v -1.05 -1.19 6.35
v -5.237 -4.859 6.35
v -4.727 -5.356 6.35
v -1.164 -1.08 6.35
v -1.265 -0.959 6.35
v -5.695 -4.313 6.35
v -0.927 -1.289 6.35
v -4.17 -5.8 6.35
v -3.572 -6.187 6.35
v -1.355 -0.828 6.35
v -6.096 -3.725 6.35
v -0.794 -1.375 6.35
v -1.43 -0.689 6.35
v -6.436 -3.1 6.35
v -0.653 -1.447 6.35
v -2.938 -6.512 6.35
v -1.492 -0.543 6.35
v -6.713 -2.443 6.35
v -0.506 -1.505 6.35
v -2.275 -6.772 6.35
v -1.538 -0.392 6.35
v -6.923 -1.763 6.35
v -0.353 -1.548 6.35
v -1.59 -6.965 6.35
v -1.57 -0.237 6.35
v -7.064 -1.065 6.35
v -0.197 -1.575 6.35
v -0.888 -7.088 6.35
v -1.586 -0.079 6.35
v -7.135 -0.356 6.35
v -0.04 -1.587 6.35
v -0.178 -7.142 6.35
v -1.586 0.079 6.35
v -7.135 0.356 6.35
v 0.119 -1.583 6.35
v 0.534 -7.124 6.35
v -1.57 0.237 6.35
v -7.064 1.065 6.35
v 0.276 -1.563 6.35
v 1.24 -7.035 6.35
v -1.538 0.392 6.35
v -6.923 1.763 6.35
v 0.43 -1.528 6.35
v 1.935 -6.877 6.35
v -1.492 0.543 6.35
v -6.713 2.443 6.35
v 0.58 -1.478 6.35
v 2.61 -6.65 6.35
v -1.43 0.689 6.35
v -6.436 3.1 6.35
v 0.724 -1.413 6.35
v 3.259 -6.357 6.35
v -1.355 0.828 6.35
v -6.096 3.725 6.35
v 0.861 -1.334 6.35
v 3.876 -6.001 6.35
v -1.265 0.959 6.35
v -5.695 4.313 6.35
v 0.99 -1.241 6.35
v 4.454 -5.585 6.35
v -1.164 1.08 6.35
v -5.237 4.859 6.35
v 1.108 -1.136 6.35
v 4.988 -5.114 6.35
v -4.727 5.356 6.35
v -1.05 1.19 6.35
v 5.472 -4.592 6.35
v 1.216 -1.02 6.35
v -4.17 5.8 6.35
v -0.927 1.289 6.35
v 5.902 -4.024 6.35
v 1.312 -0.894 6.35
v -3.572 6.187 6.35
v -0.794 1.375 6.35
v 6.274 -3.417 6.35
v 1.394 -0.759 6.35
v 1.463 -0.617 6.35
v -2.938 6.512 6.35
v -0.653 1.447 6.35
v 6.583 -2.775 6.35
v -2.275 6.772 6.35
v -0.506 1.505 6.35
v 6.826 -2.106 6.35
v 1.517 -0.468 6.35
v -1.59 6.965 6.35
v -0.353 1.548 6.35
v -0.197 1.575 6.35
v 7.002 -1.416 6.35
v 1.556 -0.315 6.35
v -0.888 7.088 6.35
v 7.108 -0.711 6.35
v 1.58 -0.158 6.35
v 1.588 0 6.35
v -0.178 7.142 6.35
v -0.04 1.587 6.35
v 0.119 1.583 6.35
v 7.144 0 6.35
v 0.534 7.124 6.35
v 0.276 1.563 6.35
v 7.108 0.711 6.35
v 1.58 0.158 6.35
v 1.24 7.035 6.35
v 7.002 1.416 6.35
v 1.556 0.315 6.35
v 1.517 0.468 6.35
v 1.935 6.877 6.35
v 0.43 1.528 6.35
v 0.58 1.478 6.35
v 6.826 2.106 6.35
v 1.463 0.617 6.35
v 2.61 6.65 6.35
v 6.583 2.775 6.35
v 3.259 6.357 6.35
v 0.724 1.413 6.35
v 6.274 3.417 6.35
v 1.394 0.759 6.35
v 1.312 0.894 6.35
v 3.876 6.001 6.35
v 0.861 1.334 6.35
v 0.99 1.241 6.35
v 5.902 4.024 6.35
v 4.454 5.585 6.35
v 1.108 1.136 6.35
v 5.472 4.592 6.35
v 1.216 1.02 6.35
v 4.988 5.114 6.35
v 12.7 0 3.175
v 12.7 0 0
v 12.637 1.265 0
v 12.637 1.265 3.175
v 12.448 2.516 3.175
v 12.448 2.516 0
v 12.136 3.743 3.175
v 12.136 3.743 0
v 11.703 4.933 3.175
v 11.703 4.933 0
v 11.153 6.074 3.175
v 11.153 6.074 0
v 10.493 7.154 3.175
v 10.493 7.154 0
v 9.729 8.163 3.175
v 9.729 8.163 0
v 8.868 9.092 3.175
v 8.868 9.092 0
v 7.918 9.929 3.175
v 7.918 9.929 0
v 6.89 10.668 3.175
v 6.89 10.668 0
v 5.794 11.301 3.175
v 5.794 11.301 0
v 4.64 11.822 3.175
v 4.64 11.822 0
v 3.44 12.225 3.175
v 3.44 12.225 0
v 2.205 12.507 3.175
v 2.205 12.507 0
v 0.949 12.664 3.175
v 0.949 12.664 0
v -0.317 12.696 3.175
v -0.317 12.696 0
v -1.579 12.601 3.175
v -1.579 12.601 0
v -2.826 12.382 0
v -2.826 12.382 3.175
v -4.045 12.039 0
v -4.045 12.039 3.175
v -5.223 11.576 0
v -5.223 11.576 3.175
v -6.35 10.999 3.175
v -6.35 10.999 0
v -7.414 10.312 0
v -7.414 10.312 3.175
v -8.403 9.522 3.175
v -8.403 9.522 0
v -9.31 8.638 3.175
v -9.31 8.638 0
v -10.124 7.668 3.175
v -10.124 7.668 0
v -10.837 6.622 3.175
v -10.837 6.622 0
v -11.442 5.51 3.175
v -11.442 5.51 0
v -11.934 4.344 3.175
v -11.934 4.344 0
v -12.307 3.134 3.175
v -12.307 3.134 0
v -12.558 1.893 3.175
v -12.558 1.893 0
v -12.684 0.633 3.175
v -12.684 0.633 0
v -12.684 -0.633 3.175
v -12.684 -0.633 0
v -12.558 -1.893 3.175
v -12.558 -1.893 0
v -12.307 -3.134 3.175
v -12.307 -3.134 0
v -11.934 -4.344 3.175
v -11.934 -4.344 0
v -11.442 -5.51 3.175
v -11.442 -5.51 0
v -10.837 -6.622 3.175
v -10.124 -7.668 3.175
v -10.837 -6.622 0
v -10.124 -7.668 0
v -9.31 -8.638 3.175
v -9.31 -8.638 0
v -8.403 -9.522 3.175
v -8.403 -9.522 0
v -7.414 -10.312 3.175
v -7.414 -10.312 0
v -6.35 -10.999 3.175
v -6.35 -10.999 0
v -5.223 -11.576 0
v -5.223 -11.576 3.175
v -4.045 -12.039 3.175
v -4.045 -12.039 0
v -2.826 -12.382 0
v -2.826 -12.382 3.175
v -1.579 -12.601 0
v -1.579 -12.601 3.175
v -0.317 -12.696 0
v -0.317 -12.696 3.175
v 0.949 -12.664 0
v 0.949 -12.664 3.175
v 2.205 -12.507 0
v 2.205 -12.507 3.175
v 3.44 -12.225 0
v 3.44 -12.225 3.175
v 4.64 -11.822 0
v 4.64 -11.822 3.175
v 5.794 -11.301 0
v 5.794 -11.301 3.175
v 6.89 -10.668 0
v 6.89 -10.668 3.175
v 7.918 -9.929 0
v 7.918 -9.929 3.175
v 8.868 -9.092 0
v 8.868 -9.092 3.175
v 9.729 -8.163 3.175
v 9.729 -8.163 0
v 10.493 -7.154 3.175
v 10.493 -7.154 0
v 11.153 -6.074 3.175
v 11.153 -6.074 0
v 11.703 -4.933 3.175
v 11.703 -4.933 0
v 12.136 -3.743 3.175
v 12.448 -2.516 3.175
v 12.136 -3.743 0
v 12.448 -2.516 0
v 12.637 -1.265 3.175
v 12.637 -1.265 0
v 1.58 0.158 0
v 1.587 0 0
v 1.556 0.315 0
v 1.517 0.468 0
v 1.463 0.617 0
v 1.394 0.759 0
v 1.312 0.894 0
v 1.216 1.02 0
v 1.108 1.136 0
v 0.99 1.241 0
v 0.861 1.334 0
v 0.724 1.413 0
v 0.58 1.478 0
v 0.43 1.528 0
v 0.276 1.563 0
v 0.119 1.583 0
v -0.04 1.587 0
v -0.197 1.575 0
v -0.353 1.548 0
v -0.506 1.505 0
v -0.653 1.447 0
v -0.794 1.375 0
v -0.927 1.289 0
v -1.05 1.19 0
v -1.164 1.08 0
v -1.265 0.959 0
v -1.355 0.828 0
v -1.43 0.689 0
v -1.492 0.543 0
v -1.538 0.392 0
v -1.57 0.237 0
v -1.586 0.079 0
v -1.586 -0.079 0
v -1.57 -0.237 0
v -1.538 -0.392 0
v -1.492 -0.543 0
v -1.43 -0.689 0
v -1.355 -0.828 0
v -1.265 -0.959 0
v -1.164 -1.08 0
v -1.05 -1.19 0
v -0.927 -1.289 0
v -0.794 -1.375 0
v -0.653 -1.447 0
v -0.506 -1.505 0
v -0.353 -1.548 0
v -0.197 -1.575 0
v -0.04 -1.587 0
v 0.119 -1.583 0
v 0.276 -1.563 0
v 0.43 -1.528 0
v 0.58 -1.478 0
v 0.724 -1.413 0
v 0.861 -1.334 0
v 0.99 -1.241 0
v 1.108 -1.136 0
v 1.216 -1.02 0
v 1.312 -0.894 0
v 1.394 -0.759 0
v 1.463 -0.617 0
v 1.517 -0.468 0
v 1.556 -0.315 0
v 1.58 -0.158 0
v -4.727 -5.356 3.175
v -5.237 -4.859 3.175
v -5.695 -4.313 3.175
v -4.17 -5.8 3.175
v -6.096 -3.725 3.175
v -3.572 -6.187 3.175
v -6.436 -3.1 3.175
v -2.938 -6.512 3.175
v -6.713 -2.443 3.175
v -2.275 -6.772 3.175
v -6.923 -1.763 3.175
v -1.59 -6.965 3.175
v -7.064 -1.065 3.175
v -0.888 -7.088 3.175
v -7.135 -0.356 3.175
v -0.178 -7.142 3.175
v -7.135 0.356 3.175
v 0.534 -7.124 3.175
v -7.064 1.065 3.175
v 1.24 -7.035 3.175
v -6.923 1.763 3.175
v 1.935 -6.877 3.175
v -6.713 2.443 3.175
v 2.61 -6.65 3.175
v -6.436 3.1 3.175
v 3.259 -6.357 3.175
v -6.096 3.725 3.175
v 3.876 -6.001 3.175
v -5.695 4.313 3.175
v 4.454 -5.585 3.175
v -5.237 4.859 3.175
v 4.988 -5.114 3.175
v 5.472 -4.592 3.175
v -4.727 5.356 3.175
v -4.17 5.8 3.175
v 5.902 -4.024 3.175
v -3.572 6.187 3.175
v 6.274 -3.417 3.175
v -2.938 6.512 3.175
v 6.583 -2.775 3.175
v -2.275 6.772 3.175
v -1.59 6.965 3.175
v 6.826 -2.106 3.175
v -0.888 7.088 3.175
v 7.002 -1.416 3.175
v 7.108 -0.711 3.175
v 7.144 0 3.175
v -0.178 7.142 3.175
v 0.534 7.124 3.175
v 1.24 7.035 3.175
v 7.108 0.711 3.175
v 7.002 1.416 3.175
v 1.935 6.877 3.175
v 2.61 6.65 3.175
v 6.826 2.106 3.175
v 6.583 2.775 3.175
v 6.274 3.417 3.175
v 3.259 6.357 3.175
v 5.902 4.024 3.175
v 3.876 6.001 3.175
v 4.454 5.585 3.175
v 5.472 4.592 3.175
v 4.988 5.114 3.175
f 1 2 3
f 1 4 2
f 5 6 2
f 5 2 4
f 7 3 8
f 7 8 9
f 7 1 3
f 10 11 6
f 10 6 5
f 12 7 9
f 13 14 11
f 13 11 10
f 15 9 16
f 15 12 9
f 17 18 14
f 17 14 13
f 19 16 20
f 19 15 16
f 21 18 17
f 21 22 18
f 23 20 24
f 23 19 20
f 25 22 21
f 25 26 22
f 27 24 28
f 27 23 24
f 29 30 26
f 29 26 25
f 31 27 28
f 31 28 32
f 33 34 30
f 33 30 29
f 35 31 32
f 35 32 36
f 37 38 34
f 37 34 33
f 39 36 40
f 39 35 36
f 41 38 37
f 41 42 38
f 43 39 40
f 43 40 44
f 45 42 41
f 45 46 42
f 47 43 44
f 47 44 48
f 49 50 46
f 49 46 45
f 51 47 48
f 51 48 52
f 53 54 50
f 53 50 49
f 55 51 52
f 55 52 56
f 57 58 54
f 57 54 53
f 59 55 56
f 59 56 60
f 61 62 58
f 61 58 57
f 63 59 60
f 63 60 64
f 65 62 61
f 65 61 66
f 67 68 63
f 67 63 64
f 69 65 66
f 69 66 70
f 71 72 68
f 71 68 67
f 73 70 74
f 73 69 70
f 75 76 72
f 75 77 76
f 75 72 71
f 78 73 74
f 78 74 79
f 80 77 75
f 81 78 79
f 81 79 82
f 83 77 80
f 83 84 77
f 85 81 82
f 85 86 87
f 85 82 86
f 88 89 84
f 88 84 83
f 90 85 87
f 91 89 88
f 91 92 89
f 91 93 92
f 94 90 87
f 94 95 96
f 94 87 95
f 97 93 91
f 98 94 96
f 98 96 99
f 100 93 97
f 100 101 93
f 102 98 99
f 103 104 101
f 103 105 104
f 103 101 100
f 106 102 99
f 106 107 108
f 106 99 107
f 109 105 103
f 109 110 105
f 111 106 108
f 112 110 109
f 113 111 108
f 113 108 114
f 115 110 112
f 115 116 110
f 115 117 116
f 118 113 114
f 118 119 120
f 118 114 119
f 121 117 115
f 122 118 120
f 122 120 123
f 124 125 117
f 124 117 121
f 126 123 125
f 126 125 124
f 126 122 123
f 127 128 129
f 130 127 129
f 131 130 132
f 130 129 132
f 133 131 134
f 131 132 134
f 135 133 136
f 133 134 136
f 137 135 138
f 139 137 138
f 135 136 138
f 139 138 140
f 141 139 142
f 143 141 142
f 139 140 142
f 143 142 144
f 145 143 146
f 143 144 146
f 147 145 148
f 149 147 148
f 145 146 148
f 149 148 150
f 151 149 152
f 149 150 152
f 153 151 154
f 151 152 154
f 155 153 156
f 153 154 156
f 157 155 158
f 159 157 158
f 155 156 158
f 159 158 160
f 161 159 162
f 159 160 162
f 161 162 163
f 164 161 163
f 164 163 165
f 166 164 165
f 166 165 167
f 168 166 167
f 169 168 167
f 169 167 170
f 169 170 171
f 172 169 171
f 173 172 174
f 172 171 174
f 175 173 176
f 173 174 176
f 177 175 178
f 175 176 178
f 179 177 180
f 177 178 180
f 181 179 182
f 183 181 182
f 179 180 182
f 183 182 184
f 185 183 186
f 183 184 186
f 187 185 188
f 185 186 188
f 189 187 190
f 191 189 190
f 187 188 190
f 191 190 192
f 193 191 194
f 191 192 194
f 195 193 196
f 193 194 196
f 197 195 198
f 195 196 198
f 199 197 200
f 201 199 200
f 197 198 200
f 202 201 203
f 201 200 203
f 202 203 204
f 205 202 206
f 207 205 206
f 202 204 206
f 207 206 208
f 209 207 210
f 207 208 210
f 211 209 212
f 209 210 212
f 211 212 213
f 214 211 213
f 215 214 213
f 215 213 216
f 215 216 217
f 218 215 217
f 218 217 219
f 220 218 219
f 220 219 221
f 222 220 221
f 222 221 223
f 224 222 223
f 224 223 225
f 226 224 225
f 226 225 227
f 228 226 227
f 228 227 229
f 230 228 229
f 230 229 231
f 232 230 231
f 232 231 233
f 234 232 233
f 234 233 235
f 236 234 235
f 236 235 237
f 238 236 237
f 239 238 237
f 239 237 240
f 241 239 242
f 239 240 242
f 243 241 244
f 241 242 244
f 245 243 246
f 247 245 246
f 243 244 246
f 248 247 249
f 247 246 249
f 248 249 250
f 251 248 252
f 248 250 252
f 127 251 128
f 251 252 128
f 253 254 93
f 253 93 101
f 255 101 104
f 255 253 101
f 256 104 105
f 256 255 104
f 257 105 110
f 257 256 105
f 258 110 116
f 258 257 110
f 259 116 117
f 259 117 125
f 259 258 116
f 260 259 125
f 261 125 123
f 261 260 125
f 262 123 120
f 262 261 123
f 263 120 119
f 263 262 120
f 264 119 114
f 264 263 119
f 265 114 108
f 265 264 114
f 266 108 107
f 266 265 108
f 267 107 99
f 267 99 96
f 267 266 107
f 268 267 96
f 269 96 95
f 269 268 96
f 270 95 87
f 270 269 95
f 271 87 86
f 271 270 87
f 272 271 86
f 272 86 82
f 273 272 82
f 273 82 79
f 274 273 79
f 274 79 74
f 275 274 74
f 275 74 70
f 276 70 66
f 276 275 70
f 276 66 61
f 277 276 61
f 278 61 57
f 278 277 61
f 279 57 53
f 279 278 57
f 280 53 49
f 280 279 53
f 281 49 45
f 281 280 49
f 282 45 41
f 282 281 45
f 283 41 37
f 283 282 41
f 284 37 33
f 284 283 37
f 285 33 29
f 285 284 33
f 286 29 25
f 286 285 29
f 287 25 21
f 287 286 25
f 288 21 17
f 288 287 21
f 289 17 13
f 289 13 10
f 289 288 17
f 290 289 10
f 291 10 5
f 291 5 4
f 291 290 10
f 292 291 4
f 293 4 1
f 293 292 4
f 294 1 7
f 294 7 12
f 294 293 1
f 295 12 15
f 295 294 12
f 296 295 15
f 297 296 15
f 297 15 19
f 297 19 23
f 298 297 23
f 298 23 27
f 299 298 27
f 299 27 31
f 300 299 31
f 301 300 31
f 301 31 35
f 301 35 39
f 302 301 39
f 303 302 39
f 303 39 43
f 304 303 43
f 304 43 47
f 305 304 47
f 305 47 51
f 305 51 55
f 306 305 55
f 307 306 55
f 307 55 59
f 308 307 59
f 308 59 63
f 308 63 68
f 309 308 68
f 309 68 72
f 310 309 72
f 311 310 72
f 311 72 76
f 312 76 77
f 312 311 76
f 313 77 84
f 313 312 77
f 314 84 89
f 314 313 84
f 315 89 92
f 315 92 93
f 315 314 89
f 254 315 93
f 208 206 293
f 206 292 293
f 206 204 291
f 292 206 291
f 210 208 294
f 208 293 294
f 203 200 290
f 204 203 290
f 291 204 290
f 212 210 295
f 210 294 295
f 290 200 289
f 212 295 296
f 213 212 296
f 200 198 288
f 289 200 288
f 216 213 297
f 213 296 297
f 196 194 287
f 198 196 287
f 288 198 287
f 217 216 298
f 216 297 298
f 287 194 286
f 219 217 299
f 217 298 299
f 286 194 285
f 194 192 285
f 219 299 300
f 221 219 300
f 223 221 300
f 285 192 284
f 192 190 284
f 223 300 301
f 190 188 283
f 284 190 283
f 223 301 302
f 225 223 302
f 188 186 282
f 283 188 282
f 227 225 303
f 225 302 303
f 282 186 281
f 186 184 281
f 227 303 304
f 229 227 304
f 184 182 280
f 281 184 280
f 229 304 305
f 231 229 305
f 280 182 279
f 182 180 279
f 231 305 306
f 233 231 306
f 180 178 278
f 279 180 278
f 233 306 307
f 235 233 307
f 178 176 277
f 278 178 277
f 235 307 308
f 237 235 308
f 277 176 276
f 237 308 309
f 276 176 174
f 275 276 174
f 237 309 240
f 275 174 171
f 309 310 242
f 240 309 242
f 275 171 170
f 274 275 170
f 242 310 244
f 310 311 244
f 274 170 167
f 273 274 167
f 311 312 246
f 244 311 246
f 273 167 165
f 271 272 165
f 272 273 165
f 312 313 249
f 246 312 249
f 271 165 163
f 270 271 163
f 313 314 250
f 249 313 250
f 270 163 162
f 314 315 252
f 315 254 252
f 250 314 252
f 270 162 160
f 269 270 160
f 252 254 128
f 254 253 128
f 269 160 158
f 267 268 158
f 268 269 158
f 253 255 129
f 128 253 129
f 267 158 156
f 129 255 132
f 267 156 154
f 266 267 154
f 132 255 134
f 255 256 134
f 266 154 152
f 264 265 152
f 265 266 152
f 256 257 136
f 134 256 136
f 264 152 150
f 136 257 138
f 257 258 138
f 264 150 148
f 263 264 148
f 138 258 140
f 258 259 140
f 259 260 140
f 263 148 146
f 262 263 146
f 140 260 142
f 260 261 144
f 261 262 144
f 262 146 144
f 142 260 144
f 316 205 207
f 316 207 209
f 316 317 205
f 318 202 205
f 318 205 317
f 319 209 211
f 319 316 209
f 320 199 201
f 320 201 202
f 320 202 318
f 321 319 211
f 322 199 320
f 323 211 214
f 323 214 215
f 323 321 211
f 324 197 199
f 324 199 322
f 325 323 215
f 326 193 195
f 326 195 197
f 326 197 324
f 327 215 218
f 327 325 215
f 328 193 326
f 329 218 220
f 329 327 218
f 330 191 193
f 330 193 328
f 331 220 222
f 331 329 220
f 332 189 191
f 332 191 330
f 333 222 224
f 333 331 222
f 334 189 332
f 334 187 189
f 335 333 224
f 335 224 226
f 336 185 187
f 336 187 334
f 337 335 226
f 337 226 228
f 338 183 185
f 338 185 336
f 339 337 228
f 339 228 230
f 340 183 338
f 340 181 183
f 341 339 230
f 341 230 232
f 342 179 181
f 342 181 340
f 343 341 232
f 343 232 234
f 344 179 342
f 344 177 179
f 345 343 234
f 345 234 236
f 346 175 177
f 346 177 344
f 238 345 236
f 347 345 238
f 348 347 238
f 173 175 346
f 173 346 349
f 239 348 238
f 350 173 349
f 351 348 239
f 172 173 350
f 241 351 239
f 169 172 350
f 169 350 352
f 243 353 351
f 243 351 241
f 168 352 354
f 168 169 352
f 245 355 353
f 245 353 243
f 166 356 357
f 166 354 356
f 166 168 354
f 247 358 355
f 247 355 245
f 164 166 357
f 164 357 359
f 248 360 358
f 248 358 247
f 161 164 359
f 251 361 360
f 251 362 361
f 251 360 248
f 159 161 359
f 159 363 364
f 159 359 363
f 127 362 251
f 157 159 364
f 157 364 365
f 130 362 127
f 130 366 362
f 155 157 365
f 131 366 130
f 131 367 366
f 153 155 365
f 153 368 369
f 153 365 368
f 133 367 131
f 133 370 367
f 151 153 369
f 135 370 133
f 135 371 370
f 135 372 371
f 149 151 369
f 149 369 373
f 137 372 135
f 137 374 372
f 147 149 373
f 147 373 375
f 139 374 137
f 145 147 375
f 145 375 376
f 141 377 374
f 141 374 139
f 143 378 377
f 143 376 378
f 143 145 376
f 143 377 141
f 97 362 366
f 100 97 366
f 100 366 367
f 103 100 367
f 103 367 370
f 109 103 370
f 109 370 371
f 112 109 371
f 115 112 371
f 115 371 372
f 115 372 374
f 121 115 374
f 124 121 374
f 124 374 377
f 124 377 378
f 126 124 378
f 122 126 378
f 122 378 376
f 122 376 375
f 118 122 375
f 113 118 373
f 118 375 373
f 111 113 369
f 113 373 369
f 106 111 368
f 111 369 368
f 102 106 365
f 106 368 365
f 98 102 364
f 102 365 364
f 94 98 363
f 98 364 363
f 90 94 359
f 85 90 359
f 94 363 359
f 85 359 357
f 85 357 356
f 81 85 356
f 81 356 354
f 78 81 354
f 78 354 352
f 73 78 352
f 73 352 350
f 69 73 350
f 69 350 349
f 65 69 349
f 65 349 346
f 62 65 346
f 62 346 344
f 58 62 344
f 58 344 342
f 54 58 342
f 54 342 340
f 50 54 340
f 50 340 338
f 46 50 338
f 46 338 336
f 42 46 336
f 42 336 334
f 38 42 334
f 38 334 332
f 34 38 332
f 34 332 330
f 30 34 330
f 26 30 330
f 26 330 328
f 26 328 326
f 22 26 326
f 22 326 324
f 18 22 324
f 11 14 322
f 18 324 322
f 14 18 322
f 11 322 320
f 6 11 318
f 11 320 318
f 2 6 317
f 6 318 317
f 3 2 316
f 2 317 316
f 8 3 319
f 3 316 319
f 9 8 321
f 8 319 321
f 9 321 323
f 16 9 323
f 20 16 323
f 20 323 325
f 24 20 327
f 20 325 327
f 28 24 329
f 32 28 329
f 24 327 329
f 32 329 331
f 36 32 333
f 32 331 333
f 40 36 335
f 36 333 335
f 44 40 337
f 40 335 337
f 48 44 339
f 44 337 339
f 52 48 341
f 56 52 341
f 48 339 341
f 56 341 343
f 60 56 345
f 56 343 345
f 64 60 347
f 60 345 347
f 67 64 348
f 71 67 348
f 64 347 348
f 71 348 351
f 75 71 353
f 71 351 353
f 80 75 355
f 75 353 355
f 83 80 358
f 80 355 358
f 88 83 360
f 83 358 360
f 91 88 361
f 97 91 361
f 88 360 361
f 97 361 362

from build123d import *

# Parameters (mm, degrees)
F0_R     = 12.7
F0_R_2   = 7.14375
F1_DEPTH = 3.175
F0_R_3   = 1.5875
F2_DEPTH = 6.35
F3_DEPTH = 6.35


with BuildPart() as f1:
    # F0 (on Top) → F1 (new body)
    with BuildSketch(Plane.XY):
        Circle(F0_R)
        Circle(F0_R_2, mode=Mode.SUBTRACT)
    extrude(amount=F1_DEPTH)

    # F0 (on Top) → F2 (join)
    with BuildSketch(Plane.XY):
        Circle(F0_R_2)
        Circle(F0_R_3, mode=Mode.SUBTRACT)
    extrude(amount=F2_DEPTH)

    # F0 (on Top) → F3 (cut)
    with BuildSketch(Plane.XY):
        Circle(F0_R_3)
    extrude(amount=-F3_DEPTH, mode=Mode.SUBTRACT)


solid = f1.part
